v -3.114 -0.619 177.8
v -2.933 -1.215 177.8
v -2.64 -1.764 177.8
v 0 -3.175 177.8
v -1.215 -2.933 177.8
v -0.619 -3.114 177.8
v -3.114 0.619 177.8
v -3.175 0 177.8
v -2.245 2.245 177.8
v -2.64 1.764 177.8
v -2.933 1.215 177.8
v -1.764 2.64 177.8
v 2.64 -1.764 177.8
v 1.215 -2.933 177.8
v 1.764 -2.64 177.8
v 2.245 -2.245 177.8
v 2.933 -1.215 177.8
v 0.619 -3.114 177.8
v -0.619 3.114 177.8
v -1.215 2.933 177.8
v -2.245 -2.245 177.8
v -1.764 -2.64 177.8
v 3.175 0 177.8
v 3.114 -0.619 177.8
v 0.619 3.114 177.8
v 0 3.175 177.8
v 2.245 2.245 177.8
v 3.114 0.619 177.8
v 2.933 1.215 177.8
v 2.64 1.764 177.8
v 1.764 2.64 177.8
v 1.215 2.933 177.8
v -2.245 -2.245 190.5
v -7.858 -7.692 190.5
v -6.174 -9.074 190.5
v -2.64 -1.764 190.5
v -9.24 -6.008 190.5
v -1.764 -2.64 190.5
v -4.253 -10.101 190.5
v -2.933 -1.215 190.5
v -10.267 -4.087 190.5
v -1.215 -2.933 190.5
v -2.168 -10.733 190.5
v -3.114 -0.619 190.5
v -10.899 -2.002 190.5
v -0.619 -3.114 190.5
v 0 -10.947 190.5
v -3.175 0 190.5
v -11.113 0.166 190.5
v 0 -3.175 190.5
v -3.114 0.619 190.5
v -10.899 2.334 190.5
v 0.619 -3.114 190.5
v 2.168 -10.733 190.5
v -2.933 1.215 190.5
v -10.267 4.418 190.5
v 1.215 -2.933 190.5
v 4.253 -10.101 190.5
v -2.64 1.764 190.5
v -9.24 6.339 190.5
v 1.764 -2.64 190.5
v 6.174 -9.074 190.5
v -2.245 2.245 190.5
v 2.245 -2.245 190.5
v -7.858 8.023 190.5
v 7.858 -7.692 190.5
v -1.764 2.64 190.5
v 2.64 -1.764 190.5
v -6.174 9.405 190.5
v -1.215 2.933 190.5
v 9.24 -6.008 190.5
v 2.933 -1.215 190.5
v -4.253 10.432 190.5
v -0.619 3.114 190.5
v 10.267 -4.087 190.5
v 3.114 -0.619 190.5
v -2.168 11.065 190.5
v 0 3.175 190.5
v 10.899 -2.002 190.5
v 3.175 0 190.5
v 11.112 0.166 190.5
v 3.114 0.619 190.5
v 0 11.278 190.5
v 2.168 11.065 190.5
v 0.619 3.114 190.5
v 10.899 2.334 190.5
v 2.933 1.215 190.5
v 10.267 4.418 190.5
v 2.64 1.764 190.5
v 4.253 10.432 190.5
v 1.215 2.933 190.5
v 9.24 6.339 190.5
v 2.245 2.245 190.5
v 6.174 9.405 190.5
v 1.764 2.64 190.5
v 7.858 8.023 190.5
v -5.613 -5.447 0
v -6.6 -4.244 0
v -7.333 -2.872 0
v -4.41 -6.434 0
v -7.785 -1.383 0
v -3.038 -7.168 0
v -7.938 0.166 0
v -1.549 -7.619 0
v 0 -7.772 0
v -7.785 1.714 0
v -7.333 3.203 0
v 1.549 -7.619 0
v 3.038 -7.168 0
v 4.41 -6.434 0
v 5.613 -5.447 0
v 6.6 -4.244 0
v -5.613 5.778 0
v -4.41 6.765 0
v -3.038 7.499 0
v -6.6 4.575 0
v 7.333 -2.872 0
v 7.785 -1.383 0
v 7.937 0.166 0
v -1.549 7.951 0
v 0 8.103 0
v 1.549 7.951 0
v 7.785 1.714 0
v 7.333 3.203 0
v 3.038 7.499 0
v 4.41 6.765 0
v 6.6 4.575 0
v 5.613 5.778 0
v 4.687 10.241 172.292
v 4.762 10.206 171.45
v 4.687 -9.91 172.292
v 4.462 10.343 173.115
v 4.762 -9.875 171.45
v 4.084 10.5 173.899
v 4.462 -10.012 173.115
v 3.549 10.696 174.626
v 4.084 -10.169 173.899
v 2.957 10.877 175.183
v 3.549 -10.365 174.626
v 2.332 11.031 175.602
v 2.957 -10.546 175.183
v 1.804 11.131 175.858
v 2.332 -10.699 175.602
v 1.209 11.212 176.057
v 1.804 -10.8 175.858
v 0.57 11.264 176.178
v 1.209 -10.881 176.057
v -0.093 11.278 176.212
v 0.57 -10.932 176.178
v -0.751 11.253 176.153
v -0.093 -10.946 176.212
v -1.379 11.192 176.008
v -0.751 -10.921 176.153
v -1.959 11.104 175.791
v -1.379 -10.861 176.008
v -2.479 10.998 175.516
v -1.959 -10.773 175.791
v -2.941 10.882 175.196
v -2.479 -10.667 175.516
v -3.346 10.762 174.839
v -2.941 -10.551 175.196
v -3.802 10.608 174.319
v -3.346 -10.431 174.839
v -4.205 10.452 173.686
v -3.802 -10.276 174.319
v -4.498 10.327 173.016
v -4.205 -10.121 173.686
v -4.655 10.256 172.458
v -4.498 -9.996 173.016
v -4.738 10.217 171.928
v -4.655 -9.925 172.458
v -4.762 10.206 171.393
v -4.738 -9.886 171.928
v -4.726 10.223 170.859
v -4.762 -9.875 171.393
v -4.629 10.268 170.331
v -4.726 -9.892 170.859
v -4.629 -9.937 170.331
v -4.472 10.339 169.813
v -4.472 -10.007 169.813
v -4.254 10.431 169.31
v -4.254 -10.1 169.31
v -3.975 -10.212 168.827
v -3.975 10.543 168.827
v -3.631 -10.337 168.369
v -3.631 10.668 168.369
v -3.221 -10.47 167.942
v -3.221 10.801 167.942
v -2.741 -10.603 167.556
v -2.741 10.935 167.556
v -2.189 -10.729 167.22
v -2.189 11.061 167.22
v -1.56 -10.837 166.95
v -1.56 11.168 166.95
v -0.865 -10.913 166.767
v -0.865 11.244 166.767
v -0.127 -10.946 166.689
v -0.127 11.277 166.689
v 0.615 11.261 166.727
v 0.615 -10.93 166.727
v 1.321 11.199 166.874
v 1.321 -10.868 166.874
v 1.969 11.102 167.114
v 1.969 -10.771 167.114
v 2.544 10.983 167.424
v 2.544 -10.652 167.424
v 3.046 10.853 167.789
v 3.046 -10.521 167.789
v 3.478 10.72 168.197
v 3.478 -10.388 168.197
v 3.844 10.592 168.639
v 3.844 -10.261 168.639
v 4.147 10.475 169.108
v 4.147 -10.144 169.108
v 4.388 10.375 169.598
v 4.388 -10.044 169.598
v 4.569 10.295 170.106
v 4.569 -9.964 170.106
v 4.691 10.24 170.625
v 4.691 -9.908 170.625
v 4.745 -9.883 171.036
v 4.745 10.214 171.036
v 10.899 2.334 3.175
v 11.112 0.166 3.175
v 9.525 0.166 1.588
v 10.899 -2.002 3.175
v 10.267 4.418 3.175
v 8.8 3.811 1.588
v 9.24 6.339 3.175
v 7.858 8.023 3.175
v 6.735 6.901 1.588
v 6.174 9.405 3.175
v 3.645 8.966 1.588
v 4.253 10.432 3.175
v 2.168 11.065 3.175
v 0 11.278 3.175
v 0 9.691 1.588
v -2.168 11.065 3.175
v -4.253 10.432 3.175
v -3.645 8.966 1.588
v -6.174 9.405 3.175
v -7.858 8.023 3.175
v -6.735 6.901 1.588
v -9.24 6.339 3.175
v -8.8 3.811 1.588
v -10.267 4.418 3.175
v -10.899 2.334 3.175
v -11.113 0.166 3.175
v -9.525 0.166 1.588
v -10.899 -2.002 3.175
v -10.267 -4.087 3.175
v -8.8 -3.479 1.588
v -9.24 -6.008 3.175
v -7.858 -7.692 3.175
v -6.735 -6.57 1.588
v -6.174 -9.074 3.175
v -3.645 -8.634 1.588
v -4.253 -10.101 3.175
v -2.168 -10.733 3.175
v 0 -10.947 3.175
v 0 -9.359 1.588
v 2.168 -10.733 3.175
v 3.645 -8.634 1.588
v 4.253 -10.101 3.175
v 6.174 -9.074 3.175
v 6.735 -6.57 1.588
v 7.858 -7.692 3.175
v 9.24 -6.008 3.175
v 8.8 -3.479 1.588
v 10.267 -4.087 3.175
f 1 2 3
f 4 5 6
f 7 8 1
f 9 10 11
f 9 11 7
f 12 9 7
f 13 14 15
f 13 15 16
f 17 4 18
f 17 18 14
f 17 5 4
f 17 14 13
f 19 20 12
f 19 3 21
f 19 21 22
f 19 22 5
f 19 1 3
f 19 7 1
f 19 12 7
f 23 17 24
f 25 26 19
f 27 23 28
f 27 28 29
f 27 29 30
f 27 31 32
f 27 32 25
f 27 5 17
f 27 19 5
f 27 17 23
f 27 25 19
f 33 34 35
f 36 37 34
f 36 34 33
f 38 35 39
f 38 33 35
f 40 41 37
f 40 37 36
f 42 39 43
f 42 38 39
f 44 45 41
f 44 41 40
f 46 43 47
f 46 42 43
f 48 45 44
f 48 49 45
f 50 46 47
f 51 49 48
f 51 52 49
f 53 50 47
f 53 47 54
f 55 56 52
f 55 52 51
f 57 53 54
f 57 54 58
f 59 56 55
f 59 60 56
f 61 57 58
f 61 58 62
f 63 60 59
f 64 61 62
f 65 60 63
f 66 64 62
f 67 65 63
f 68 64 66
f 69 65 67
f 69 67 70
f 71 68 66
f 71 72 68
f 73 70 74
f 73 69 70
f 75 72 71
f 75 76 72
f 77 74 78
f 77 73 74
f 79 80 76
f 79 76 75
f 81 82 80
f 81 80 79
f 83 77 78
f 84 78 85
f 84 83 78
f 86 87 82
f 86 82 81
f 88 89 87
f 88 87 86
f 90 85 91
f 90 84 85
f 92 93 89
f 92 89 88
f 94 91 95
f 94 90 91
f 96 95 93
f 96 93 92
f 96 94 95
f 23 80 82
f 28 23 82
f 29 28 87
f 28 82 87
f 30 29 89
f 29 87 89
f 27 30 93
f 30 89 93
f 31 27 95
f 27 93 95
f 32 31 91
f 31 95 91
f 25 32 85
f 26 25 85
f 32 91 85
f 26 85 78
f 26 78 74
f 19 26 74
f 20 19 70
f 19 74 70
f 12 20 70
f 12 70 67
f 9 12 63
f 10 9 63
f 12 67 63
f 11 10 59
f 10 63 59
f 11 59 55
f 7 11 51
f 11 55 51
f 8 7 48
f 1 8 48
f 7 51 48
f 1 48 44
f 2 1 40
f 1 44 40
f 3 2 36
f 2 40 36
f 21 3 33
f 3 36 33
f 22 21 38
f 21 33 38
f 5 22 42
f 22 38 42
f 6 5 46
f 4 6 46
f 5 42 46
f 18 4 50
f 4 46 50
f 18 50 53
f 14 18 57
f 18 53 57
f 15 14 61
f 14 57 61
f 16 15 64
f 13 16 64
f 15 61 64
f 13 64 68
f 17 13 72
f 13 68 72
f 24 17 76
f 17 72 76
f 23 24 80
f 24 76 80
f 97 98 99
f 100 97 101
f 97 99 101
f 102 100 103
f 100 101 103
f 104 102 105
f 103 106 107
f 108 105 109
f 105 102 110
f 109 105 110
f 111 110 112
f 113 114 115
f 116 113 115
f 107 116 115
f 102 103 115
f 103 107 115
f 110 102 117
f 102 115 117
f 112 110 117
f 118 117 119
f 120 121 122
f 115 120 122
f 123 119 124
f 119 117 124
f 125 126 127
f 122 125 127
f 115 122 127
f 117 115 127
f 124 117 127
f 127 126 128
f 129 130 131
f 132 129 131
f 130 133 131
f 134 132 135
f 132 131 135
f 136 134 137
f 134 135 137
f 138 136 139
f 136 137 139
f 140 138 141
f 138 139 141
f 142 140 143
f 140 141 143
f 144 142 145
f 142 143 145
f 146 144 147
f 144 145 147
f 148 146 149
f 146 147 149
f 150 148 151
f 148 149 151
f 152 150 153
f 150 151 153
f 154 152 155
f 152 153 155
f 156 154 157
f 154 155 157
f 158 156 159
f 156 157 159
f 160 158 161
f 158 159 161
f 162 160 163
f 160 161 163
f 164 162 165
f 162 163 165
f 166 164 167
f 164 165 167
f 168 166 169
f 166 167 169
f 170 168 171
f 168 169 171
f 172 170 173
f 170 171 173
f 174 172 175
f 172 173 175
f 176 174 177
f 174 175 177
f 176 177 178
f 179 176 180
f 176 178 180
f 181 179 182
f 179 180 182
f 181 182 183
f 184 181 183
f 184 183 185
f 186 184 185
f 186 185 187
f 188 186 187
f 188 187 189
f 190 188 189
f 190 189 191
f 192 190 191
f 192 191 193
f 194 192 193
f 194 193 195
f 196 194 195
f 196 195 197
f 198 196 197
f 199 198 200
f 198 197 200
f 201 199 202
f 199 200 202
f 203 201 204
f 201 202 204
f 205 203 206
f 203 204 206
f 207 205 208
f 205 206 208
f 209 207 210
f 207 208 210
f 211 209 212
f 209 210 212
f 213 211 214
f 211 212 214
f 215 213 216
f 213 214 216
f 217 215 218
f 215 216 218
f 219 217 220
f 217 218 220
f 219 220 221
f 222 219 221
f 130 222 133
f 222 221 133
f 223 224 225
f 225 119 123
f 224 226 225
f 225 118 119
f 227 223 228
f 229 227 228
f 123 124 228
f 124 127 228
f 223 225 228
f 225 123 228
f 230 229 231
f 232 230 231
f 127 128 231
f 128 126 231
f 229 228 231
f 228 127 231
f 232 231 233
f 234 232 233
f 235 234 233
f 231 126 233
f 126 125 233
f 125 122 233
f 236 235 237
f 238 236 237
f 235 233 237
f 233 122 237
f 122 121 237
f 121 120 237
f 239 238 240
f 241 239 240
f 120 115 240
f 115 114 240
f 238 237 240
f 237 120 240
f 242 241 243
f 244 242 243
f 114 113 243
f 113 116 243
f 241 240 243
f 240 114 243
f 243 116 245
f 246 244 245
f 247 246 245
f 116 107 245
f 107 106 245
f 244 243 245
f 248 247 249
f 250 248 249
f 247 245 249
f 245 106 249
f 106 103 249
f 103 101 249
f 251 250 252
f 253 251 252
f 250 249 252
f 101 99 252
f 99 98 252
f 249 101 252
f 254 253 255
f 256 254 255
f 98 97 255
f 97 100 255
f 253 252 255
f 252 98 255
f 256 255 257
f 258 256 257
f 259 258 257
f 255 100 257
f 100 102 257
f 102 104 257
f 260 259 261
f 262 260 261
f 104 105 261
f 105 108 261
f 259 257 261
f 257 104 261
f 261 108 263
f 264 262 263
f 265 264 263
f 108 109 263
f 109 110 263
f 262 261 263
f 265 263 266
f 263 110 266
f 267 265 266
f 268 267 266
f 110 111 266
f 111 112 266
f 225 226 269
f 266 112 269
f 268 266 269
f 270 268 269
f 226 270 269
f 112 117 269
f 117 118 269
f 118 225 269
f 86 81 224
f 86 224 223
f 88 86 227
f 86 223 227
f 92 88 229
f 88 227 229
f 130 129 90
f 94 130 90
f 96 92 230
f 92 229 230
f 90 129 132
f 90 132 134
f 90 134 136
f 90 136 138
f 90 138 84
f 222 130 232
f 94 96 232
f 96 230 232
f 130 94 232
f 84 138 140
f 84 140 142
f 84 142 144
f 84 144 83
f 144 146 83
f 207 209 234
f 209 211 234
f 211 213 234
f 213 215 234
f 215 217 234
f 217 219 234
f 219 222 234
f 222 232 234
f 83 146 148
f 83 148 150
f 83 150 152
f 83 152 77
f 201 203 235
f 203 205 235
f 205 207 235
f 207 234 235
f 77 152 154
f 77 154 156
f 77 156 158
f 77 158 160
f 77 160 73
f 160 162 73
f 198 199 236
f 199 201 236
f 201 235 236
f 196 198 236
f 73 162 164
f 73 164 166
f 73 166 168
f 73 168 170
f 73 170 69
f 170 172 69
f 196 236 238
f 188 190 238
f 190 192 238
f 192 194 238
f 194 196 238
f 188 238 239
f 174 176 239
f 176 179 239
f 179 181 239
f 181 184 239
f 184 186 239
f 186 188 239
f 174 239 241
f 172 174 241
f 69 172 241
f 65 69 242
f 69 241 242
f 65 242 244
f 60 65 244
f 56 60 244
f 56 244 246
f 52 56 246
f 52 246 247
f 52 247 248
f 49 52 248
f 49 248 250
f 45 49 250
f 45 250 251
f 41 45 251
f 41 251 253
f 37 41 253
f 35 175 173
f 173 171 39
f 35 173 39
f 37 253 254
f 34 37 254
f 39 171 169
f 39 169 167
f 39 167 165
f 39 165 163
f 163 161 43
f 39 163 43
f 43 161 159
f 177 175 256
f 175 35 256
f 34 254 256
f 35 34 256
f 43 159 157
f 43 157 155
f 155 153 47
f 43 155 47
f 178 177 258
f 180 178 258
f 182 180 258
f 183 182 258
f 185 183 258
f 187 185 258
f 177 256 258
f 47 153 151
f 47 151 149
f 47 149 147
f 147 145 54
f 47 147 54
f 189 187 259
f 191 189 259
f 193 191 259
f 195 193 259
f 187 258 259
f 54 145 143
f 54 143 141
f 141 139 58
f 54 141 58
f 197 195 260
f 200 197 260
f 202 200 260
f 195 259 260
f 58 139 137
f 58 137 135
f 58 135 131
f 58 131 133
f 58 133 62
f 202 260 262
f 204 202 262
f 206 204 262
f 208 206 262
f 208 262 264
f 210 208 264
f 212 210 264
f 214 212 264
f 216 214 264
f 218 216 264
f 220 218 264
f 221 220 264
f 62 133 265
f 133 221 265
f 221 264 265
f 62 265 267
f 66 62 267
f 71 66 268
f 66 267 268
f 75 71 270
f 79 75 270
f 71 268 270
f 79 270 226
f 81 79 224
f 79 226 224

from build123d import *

# Parameters (mm, degrees)
F0_R          = 11.1125
F1_DEPTH      = 190.5
F2_SIZE       = 3.175
F3_R          = 4.7625
F4_DEPTH      = 25.4
F4_DEPTH_BACK = 25.4
F5_R          = 3.175
F6_DEPTH      = 12.7


with BuildPart() as f1:
    # F0 (on Top) → F1 (new body)
    with BuildSketch(Plane.XY):
        with Locations((-1.1552e-06, 0.1656521781)):
            Circle(F0_R)
    extrude(amount=F1_DEPTH)

    # F2
    f2_edges = [f1.edges().sort_by_distance(p)[0] for p in [
        (-11.112501, 0.165652, 0),
    ]]
    chamfer(f2_edges, length=F2_SIZE)

    # F3 (on Front) → F4 (cut, two sides)
    with BuildSketch(Plane.XZ) as f4_sk:
        with Locations((0, 171.45)):
            Circle(F3_R)
    extrude(amount=-F4_DEPTH, mode=Mode.SUBTRACT)
    extrude(f4_sk.sketch, amount=F4_DEPTH_BACK, mode=Mode.SUBTRACT)

    # F5 (on face) → F6 (cut)
    with BuildSketch(Plane.XY.offset(190.5)):
        Circle(F5_R)
    extrude(amount=-F6_DEPTH, mode=Mode.SUBTRACT)


solid = f1.part
